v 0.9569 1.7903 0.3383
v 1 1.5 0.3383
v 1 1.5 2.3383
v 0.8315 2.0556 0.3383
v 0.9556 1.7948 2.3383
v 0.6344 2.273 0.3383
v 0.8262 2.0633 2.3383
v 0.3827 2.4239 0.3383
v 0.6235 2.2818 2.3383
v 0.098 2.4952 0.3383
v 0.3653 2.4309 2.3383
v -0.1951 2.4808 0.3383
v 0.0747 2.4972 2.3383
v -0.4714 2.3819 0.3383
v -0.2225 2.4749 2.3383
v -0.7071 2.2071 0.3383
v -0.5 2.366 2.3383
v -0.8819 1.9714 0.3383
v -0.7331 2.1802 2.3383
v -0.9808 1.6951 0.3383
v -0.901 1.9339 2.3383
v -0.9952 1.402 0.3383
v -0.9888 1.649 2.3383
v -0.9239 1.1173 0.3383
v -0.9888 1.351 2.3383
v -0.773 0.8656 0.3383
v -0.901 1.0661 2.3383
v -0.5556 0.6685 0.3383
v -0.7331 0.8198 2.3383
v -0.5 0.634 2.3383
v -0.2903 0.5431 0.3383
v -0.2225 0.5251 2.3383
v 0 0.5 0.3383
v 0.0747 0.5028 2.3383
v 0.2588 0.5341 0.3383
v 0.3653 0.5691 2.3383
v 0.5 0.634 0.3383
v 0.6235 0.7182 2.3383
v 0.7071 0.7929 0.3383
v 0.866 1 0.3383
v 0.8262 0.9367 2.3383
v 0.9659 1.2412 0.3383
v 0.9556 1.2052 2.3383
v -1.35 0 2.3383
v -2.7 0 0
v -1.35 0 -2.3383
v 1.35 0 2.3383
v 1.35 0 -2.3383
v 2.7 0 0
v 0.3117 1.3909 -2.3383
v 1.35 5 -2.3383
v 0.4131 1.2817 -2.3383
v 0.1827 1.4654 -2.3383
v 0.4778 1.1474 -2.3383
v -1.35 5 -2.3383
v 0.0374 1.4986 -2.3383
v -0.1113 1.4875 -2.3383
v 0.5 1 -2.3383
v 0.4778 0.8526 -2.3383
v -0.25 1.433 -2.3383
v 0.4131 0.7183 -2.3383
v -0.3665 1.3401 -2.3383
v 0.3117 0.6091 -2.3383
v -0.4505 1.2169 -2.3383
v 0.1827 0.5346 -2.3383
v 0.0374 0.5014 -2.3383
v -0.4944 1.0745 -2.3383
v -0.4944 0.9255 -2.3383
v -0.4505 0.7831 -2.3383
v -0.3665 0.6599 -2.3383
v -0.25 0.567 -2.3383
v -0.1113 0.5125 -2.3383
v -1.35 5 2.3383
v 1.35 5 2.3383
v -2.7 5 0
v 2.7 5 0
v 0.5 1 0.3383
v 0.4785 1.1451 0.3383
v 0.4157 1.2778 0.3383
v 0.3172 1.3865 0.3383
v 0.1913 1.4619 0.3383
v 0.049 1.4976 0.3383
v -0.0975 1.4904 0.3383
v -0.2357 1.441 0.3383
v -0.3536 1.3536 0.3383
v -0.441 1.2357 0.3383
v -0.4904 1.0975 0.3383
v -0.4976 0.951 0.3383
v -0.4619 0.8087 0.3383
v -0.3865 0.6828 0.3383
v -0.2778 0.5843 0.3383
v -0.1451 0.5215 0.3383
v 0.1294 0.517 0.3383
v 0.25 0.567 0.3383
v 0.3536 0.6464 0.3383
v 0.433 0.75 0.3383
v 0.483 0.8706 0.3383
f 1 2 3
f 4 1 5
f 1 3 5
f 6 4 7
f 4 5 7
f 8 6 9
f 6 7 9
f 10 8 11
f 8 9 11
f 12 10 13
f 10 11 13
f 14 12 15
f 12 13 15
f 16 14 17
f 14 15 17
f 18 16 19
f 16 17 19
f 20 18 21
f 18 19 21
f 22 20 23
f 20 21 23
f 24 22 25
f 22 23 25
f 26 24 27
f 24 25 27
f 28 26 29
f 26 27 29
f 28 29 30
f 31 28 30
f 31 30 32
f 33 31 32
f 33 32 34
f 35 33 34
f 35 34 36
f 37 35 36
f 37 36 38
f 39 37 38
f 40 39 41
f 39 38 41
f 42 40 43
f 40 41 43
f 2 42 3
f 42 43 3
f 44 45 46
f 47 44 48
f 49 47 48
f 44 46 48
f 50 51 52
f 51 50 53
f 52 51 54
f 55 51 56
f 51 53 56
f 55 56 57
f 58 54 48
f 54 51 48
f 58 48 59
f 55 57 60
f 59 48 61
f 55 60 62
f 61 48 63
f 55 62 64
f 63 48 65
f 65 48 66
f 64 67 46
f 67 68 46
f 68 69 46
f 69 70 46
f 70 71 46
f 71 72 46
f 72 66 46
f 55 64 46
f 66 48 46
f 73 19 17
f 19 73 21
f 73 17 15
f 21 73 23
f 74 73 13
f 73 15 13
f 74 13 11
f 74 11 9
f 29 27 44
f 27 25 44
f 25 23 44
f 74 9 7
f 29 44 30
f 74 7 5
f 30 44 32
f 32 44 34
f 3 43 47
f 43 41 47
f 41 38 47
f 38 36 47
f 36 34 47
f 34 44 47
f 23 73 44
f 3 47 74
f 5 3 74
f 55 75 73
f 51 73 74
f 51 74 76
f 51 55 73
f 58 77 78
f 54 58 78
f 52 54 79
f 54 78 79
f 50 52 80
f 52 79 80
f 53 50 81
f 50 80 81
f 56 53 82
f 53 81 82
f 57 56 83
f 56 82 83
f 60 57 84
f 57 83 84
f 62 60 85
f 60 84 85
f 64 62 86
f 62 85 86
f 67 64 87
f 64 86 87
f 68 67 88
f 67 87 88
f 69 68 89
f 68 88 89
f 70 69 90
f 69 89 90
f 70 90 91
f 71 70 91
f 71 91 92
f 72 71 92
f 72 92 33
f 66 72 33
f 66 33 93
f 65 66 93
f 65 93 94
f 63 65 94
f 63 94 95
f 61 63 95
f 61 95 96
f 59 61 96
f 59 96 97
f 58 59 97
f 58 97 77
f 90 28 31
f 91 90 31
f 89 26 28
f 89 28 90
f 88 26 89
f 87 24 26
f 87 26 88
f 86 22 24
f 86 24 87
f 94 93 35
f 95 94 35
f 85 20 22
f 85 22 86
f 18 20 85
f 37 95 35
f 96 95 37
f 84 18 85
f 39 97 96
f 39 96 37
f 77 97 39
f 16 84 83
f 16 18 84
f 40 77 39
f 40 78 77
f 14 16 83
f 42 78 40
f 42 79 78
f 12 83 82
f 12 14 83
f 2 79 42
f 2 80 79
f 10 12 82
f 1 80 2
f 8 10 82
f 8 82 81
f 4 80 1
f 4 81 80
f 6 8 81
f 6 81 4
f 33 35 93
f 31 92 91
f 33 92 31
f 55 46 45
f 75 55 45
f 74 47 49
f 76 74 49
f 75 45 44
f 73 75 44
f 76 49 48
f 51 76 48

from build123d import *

# Parameters (mm, degrees)
SALIENTE_EXTRUIR1_DEPTH = 5
CROQUIS2_R              = 0.5
CORTAR_EXTRUIR1_DEPTH   = 5.67653718
CROQUIS3_R              = 1
CORTAR_EXTRUIR2_DEPTH   = 2


with BuildPart() as part:
    # Croquis1 → Saliente-Extruir1 (new body)
    with BuildSketch(Plane(origin=(0, 0, 0), x_dir=(1, 0, 0), z_dir=(0, 1, 0))):
        Polygon((2.7, 0), (1.35, 2.33826859), (-1.35, 2.33826859), (-2.7, 0), (-1.35, -2.33826859), (1.35, -2.33826859), align=None)
    extrude(amount=SALIENTE_EXTRUIR1_DEPTH)

    # Croquis2 → Cortar-Extruir1 (cut, through all)
    with BuildSketch(Plane.XY.offset(2.33826859)):
        with Locations((0, 1)):
            Circle(CROQUIS2_R)
    extrude(amount=-CORTAR_EXTRUIR1_DEPTH, mode=Mode.SUBTRACT)

    # Croquis3 → Cortar-Extruir2 (cut)
    with BuildSketch(Plane.XY.offset(2.33826859)):
        with Locations((0, 1.5)):
            Circle(CROQUIS3_R)
    extrude(amount=-CORTAR_EXTRUIR2_DEPTH, mode=Mode.SUBTRACT)


solid = part.part
